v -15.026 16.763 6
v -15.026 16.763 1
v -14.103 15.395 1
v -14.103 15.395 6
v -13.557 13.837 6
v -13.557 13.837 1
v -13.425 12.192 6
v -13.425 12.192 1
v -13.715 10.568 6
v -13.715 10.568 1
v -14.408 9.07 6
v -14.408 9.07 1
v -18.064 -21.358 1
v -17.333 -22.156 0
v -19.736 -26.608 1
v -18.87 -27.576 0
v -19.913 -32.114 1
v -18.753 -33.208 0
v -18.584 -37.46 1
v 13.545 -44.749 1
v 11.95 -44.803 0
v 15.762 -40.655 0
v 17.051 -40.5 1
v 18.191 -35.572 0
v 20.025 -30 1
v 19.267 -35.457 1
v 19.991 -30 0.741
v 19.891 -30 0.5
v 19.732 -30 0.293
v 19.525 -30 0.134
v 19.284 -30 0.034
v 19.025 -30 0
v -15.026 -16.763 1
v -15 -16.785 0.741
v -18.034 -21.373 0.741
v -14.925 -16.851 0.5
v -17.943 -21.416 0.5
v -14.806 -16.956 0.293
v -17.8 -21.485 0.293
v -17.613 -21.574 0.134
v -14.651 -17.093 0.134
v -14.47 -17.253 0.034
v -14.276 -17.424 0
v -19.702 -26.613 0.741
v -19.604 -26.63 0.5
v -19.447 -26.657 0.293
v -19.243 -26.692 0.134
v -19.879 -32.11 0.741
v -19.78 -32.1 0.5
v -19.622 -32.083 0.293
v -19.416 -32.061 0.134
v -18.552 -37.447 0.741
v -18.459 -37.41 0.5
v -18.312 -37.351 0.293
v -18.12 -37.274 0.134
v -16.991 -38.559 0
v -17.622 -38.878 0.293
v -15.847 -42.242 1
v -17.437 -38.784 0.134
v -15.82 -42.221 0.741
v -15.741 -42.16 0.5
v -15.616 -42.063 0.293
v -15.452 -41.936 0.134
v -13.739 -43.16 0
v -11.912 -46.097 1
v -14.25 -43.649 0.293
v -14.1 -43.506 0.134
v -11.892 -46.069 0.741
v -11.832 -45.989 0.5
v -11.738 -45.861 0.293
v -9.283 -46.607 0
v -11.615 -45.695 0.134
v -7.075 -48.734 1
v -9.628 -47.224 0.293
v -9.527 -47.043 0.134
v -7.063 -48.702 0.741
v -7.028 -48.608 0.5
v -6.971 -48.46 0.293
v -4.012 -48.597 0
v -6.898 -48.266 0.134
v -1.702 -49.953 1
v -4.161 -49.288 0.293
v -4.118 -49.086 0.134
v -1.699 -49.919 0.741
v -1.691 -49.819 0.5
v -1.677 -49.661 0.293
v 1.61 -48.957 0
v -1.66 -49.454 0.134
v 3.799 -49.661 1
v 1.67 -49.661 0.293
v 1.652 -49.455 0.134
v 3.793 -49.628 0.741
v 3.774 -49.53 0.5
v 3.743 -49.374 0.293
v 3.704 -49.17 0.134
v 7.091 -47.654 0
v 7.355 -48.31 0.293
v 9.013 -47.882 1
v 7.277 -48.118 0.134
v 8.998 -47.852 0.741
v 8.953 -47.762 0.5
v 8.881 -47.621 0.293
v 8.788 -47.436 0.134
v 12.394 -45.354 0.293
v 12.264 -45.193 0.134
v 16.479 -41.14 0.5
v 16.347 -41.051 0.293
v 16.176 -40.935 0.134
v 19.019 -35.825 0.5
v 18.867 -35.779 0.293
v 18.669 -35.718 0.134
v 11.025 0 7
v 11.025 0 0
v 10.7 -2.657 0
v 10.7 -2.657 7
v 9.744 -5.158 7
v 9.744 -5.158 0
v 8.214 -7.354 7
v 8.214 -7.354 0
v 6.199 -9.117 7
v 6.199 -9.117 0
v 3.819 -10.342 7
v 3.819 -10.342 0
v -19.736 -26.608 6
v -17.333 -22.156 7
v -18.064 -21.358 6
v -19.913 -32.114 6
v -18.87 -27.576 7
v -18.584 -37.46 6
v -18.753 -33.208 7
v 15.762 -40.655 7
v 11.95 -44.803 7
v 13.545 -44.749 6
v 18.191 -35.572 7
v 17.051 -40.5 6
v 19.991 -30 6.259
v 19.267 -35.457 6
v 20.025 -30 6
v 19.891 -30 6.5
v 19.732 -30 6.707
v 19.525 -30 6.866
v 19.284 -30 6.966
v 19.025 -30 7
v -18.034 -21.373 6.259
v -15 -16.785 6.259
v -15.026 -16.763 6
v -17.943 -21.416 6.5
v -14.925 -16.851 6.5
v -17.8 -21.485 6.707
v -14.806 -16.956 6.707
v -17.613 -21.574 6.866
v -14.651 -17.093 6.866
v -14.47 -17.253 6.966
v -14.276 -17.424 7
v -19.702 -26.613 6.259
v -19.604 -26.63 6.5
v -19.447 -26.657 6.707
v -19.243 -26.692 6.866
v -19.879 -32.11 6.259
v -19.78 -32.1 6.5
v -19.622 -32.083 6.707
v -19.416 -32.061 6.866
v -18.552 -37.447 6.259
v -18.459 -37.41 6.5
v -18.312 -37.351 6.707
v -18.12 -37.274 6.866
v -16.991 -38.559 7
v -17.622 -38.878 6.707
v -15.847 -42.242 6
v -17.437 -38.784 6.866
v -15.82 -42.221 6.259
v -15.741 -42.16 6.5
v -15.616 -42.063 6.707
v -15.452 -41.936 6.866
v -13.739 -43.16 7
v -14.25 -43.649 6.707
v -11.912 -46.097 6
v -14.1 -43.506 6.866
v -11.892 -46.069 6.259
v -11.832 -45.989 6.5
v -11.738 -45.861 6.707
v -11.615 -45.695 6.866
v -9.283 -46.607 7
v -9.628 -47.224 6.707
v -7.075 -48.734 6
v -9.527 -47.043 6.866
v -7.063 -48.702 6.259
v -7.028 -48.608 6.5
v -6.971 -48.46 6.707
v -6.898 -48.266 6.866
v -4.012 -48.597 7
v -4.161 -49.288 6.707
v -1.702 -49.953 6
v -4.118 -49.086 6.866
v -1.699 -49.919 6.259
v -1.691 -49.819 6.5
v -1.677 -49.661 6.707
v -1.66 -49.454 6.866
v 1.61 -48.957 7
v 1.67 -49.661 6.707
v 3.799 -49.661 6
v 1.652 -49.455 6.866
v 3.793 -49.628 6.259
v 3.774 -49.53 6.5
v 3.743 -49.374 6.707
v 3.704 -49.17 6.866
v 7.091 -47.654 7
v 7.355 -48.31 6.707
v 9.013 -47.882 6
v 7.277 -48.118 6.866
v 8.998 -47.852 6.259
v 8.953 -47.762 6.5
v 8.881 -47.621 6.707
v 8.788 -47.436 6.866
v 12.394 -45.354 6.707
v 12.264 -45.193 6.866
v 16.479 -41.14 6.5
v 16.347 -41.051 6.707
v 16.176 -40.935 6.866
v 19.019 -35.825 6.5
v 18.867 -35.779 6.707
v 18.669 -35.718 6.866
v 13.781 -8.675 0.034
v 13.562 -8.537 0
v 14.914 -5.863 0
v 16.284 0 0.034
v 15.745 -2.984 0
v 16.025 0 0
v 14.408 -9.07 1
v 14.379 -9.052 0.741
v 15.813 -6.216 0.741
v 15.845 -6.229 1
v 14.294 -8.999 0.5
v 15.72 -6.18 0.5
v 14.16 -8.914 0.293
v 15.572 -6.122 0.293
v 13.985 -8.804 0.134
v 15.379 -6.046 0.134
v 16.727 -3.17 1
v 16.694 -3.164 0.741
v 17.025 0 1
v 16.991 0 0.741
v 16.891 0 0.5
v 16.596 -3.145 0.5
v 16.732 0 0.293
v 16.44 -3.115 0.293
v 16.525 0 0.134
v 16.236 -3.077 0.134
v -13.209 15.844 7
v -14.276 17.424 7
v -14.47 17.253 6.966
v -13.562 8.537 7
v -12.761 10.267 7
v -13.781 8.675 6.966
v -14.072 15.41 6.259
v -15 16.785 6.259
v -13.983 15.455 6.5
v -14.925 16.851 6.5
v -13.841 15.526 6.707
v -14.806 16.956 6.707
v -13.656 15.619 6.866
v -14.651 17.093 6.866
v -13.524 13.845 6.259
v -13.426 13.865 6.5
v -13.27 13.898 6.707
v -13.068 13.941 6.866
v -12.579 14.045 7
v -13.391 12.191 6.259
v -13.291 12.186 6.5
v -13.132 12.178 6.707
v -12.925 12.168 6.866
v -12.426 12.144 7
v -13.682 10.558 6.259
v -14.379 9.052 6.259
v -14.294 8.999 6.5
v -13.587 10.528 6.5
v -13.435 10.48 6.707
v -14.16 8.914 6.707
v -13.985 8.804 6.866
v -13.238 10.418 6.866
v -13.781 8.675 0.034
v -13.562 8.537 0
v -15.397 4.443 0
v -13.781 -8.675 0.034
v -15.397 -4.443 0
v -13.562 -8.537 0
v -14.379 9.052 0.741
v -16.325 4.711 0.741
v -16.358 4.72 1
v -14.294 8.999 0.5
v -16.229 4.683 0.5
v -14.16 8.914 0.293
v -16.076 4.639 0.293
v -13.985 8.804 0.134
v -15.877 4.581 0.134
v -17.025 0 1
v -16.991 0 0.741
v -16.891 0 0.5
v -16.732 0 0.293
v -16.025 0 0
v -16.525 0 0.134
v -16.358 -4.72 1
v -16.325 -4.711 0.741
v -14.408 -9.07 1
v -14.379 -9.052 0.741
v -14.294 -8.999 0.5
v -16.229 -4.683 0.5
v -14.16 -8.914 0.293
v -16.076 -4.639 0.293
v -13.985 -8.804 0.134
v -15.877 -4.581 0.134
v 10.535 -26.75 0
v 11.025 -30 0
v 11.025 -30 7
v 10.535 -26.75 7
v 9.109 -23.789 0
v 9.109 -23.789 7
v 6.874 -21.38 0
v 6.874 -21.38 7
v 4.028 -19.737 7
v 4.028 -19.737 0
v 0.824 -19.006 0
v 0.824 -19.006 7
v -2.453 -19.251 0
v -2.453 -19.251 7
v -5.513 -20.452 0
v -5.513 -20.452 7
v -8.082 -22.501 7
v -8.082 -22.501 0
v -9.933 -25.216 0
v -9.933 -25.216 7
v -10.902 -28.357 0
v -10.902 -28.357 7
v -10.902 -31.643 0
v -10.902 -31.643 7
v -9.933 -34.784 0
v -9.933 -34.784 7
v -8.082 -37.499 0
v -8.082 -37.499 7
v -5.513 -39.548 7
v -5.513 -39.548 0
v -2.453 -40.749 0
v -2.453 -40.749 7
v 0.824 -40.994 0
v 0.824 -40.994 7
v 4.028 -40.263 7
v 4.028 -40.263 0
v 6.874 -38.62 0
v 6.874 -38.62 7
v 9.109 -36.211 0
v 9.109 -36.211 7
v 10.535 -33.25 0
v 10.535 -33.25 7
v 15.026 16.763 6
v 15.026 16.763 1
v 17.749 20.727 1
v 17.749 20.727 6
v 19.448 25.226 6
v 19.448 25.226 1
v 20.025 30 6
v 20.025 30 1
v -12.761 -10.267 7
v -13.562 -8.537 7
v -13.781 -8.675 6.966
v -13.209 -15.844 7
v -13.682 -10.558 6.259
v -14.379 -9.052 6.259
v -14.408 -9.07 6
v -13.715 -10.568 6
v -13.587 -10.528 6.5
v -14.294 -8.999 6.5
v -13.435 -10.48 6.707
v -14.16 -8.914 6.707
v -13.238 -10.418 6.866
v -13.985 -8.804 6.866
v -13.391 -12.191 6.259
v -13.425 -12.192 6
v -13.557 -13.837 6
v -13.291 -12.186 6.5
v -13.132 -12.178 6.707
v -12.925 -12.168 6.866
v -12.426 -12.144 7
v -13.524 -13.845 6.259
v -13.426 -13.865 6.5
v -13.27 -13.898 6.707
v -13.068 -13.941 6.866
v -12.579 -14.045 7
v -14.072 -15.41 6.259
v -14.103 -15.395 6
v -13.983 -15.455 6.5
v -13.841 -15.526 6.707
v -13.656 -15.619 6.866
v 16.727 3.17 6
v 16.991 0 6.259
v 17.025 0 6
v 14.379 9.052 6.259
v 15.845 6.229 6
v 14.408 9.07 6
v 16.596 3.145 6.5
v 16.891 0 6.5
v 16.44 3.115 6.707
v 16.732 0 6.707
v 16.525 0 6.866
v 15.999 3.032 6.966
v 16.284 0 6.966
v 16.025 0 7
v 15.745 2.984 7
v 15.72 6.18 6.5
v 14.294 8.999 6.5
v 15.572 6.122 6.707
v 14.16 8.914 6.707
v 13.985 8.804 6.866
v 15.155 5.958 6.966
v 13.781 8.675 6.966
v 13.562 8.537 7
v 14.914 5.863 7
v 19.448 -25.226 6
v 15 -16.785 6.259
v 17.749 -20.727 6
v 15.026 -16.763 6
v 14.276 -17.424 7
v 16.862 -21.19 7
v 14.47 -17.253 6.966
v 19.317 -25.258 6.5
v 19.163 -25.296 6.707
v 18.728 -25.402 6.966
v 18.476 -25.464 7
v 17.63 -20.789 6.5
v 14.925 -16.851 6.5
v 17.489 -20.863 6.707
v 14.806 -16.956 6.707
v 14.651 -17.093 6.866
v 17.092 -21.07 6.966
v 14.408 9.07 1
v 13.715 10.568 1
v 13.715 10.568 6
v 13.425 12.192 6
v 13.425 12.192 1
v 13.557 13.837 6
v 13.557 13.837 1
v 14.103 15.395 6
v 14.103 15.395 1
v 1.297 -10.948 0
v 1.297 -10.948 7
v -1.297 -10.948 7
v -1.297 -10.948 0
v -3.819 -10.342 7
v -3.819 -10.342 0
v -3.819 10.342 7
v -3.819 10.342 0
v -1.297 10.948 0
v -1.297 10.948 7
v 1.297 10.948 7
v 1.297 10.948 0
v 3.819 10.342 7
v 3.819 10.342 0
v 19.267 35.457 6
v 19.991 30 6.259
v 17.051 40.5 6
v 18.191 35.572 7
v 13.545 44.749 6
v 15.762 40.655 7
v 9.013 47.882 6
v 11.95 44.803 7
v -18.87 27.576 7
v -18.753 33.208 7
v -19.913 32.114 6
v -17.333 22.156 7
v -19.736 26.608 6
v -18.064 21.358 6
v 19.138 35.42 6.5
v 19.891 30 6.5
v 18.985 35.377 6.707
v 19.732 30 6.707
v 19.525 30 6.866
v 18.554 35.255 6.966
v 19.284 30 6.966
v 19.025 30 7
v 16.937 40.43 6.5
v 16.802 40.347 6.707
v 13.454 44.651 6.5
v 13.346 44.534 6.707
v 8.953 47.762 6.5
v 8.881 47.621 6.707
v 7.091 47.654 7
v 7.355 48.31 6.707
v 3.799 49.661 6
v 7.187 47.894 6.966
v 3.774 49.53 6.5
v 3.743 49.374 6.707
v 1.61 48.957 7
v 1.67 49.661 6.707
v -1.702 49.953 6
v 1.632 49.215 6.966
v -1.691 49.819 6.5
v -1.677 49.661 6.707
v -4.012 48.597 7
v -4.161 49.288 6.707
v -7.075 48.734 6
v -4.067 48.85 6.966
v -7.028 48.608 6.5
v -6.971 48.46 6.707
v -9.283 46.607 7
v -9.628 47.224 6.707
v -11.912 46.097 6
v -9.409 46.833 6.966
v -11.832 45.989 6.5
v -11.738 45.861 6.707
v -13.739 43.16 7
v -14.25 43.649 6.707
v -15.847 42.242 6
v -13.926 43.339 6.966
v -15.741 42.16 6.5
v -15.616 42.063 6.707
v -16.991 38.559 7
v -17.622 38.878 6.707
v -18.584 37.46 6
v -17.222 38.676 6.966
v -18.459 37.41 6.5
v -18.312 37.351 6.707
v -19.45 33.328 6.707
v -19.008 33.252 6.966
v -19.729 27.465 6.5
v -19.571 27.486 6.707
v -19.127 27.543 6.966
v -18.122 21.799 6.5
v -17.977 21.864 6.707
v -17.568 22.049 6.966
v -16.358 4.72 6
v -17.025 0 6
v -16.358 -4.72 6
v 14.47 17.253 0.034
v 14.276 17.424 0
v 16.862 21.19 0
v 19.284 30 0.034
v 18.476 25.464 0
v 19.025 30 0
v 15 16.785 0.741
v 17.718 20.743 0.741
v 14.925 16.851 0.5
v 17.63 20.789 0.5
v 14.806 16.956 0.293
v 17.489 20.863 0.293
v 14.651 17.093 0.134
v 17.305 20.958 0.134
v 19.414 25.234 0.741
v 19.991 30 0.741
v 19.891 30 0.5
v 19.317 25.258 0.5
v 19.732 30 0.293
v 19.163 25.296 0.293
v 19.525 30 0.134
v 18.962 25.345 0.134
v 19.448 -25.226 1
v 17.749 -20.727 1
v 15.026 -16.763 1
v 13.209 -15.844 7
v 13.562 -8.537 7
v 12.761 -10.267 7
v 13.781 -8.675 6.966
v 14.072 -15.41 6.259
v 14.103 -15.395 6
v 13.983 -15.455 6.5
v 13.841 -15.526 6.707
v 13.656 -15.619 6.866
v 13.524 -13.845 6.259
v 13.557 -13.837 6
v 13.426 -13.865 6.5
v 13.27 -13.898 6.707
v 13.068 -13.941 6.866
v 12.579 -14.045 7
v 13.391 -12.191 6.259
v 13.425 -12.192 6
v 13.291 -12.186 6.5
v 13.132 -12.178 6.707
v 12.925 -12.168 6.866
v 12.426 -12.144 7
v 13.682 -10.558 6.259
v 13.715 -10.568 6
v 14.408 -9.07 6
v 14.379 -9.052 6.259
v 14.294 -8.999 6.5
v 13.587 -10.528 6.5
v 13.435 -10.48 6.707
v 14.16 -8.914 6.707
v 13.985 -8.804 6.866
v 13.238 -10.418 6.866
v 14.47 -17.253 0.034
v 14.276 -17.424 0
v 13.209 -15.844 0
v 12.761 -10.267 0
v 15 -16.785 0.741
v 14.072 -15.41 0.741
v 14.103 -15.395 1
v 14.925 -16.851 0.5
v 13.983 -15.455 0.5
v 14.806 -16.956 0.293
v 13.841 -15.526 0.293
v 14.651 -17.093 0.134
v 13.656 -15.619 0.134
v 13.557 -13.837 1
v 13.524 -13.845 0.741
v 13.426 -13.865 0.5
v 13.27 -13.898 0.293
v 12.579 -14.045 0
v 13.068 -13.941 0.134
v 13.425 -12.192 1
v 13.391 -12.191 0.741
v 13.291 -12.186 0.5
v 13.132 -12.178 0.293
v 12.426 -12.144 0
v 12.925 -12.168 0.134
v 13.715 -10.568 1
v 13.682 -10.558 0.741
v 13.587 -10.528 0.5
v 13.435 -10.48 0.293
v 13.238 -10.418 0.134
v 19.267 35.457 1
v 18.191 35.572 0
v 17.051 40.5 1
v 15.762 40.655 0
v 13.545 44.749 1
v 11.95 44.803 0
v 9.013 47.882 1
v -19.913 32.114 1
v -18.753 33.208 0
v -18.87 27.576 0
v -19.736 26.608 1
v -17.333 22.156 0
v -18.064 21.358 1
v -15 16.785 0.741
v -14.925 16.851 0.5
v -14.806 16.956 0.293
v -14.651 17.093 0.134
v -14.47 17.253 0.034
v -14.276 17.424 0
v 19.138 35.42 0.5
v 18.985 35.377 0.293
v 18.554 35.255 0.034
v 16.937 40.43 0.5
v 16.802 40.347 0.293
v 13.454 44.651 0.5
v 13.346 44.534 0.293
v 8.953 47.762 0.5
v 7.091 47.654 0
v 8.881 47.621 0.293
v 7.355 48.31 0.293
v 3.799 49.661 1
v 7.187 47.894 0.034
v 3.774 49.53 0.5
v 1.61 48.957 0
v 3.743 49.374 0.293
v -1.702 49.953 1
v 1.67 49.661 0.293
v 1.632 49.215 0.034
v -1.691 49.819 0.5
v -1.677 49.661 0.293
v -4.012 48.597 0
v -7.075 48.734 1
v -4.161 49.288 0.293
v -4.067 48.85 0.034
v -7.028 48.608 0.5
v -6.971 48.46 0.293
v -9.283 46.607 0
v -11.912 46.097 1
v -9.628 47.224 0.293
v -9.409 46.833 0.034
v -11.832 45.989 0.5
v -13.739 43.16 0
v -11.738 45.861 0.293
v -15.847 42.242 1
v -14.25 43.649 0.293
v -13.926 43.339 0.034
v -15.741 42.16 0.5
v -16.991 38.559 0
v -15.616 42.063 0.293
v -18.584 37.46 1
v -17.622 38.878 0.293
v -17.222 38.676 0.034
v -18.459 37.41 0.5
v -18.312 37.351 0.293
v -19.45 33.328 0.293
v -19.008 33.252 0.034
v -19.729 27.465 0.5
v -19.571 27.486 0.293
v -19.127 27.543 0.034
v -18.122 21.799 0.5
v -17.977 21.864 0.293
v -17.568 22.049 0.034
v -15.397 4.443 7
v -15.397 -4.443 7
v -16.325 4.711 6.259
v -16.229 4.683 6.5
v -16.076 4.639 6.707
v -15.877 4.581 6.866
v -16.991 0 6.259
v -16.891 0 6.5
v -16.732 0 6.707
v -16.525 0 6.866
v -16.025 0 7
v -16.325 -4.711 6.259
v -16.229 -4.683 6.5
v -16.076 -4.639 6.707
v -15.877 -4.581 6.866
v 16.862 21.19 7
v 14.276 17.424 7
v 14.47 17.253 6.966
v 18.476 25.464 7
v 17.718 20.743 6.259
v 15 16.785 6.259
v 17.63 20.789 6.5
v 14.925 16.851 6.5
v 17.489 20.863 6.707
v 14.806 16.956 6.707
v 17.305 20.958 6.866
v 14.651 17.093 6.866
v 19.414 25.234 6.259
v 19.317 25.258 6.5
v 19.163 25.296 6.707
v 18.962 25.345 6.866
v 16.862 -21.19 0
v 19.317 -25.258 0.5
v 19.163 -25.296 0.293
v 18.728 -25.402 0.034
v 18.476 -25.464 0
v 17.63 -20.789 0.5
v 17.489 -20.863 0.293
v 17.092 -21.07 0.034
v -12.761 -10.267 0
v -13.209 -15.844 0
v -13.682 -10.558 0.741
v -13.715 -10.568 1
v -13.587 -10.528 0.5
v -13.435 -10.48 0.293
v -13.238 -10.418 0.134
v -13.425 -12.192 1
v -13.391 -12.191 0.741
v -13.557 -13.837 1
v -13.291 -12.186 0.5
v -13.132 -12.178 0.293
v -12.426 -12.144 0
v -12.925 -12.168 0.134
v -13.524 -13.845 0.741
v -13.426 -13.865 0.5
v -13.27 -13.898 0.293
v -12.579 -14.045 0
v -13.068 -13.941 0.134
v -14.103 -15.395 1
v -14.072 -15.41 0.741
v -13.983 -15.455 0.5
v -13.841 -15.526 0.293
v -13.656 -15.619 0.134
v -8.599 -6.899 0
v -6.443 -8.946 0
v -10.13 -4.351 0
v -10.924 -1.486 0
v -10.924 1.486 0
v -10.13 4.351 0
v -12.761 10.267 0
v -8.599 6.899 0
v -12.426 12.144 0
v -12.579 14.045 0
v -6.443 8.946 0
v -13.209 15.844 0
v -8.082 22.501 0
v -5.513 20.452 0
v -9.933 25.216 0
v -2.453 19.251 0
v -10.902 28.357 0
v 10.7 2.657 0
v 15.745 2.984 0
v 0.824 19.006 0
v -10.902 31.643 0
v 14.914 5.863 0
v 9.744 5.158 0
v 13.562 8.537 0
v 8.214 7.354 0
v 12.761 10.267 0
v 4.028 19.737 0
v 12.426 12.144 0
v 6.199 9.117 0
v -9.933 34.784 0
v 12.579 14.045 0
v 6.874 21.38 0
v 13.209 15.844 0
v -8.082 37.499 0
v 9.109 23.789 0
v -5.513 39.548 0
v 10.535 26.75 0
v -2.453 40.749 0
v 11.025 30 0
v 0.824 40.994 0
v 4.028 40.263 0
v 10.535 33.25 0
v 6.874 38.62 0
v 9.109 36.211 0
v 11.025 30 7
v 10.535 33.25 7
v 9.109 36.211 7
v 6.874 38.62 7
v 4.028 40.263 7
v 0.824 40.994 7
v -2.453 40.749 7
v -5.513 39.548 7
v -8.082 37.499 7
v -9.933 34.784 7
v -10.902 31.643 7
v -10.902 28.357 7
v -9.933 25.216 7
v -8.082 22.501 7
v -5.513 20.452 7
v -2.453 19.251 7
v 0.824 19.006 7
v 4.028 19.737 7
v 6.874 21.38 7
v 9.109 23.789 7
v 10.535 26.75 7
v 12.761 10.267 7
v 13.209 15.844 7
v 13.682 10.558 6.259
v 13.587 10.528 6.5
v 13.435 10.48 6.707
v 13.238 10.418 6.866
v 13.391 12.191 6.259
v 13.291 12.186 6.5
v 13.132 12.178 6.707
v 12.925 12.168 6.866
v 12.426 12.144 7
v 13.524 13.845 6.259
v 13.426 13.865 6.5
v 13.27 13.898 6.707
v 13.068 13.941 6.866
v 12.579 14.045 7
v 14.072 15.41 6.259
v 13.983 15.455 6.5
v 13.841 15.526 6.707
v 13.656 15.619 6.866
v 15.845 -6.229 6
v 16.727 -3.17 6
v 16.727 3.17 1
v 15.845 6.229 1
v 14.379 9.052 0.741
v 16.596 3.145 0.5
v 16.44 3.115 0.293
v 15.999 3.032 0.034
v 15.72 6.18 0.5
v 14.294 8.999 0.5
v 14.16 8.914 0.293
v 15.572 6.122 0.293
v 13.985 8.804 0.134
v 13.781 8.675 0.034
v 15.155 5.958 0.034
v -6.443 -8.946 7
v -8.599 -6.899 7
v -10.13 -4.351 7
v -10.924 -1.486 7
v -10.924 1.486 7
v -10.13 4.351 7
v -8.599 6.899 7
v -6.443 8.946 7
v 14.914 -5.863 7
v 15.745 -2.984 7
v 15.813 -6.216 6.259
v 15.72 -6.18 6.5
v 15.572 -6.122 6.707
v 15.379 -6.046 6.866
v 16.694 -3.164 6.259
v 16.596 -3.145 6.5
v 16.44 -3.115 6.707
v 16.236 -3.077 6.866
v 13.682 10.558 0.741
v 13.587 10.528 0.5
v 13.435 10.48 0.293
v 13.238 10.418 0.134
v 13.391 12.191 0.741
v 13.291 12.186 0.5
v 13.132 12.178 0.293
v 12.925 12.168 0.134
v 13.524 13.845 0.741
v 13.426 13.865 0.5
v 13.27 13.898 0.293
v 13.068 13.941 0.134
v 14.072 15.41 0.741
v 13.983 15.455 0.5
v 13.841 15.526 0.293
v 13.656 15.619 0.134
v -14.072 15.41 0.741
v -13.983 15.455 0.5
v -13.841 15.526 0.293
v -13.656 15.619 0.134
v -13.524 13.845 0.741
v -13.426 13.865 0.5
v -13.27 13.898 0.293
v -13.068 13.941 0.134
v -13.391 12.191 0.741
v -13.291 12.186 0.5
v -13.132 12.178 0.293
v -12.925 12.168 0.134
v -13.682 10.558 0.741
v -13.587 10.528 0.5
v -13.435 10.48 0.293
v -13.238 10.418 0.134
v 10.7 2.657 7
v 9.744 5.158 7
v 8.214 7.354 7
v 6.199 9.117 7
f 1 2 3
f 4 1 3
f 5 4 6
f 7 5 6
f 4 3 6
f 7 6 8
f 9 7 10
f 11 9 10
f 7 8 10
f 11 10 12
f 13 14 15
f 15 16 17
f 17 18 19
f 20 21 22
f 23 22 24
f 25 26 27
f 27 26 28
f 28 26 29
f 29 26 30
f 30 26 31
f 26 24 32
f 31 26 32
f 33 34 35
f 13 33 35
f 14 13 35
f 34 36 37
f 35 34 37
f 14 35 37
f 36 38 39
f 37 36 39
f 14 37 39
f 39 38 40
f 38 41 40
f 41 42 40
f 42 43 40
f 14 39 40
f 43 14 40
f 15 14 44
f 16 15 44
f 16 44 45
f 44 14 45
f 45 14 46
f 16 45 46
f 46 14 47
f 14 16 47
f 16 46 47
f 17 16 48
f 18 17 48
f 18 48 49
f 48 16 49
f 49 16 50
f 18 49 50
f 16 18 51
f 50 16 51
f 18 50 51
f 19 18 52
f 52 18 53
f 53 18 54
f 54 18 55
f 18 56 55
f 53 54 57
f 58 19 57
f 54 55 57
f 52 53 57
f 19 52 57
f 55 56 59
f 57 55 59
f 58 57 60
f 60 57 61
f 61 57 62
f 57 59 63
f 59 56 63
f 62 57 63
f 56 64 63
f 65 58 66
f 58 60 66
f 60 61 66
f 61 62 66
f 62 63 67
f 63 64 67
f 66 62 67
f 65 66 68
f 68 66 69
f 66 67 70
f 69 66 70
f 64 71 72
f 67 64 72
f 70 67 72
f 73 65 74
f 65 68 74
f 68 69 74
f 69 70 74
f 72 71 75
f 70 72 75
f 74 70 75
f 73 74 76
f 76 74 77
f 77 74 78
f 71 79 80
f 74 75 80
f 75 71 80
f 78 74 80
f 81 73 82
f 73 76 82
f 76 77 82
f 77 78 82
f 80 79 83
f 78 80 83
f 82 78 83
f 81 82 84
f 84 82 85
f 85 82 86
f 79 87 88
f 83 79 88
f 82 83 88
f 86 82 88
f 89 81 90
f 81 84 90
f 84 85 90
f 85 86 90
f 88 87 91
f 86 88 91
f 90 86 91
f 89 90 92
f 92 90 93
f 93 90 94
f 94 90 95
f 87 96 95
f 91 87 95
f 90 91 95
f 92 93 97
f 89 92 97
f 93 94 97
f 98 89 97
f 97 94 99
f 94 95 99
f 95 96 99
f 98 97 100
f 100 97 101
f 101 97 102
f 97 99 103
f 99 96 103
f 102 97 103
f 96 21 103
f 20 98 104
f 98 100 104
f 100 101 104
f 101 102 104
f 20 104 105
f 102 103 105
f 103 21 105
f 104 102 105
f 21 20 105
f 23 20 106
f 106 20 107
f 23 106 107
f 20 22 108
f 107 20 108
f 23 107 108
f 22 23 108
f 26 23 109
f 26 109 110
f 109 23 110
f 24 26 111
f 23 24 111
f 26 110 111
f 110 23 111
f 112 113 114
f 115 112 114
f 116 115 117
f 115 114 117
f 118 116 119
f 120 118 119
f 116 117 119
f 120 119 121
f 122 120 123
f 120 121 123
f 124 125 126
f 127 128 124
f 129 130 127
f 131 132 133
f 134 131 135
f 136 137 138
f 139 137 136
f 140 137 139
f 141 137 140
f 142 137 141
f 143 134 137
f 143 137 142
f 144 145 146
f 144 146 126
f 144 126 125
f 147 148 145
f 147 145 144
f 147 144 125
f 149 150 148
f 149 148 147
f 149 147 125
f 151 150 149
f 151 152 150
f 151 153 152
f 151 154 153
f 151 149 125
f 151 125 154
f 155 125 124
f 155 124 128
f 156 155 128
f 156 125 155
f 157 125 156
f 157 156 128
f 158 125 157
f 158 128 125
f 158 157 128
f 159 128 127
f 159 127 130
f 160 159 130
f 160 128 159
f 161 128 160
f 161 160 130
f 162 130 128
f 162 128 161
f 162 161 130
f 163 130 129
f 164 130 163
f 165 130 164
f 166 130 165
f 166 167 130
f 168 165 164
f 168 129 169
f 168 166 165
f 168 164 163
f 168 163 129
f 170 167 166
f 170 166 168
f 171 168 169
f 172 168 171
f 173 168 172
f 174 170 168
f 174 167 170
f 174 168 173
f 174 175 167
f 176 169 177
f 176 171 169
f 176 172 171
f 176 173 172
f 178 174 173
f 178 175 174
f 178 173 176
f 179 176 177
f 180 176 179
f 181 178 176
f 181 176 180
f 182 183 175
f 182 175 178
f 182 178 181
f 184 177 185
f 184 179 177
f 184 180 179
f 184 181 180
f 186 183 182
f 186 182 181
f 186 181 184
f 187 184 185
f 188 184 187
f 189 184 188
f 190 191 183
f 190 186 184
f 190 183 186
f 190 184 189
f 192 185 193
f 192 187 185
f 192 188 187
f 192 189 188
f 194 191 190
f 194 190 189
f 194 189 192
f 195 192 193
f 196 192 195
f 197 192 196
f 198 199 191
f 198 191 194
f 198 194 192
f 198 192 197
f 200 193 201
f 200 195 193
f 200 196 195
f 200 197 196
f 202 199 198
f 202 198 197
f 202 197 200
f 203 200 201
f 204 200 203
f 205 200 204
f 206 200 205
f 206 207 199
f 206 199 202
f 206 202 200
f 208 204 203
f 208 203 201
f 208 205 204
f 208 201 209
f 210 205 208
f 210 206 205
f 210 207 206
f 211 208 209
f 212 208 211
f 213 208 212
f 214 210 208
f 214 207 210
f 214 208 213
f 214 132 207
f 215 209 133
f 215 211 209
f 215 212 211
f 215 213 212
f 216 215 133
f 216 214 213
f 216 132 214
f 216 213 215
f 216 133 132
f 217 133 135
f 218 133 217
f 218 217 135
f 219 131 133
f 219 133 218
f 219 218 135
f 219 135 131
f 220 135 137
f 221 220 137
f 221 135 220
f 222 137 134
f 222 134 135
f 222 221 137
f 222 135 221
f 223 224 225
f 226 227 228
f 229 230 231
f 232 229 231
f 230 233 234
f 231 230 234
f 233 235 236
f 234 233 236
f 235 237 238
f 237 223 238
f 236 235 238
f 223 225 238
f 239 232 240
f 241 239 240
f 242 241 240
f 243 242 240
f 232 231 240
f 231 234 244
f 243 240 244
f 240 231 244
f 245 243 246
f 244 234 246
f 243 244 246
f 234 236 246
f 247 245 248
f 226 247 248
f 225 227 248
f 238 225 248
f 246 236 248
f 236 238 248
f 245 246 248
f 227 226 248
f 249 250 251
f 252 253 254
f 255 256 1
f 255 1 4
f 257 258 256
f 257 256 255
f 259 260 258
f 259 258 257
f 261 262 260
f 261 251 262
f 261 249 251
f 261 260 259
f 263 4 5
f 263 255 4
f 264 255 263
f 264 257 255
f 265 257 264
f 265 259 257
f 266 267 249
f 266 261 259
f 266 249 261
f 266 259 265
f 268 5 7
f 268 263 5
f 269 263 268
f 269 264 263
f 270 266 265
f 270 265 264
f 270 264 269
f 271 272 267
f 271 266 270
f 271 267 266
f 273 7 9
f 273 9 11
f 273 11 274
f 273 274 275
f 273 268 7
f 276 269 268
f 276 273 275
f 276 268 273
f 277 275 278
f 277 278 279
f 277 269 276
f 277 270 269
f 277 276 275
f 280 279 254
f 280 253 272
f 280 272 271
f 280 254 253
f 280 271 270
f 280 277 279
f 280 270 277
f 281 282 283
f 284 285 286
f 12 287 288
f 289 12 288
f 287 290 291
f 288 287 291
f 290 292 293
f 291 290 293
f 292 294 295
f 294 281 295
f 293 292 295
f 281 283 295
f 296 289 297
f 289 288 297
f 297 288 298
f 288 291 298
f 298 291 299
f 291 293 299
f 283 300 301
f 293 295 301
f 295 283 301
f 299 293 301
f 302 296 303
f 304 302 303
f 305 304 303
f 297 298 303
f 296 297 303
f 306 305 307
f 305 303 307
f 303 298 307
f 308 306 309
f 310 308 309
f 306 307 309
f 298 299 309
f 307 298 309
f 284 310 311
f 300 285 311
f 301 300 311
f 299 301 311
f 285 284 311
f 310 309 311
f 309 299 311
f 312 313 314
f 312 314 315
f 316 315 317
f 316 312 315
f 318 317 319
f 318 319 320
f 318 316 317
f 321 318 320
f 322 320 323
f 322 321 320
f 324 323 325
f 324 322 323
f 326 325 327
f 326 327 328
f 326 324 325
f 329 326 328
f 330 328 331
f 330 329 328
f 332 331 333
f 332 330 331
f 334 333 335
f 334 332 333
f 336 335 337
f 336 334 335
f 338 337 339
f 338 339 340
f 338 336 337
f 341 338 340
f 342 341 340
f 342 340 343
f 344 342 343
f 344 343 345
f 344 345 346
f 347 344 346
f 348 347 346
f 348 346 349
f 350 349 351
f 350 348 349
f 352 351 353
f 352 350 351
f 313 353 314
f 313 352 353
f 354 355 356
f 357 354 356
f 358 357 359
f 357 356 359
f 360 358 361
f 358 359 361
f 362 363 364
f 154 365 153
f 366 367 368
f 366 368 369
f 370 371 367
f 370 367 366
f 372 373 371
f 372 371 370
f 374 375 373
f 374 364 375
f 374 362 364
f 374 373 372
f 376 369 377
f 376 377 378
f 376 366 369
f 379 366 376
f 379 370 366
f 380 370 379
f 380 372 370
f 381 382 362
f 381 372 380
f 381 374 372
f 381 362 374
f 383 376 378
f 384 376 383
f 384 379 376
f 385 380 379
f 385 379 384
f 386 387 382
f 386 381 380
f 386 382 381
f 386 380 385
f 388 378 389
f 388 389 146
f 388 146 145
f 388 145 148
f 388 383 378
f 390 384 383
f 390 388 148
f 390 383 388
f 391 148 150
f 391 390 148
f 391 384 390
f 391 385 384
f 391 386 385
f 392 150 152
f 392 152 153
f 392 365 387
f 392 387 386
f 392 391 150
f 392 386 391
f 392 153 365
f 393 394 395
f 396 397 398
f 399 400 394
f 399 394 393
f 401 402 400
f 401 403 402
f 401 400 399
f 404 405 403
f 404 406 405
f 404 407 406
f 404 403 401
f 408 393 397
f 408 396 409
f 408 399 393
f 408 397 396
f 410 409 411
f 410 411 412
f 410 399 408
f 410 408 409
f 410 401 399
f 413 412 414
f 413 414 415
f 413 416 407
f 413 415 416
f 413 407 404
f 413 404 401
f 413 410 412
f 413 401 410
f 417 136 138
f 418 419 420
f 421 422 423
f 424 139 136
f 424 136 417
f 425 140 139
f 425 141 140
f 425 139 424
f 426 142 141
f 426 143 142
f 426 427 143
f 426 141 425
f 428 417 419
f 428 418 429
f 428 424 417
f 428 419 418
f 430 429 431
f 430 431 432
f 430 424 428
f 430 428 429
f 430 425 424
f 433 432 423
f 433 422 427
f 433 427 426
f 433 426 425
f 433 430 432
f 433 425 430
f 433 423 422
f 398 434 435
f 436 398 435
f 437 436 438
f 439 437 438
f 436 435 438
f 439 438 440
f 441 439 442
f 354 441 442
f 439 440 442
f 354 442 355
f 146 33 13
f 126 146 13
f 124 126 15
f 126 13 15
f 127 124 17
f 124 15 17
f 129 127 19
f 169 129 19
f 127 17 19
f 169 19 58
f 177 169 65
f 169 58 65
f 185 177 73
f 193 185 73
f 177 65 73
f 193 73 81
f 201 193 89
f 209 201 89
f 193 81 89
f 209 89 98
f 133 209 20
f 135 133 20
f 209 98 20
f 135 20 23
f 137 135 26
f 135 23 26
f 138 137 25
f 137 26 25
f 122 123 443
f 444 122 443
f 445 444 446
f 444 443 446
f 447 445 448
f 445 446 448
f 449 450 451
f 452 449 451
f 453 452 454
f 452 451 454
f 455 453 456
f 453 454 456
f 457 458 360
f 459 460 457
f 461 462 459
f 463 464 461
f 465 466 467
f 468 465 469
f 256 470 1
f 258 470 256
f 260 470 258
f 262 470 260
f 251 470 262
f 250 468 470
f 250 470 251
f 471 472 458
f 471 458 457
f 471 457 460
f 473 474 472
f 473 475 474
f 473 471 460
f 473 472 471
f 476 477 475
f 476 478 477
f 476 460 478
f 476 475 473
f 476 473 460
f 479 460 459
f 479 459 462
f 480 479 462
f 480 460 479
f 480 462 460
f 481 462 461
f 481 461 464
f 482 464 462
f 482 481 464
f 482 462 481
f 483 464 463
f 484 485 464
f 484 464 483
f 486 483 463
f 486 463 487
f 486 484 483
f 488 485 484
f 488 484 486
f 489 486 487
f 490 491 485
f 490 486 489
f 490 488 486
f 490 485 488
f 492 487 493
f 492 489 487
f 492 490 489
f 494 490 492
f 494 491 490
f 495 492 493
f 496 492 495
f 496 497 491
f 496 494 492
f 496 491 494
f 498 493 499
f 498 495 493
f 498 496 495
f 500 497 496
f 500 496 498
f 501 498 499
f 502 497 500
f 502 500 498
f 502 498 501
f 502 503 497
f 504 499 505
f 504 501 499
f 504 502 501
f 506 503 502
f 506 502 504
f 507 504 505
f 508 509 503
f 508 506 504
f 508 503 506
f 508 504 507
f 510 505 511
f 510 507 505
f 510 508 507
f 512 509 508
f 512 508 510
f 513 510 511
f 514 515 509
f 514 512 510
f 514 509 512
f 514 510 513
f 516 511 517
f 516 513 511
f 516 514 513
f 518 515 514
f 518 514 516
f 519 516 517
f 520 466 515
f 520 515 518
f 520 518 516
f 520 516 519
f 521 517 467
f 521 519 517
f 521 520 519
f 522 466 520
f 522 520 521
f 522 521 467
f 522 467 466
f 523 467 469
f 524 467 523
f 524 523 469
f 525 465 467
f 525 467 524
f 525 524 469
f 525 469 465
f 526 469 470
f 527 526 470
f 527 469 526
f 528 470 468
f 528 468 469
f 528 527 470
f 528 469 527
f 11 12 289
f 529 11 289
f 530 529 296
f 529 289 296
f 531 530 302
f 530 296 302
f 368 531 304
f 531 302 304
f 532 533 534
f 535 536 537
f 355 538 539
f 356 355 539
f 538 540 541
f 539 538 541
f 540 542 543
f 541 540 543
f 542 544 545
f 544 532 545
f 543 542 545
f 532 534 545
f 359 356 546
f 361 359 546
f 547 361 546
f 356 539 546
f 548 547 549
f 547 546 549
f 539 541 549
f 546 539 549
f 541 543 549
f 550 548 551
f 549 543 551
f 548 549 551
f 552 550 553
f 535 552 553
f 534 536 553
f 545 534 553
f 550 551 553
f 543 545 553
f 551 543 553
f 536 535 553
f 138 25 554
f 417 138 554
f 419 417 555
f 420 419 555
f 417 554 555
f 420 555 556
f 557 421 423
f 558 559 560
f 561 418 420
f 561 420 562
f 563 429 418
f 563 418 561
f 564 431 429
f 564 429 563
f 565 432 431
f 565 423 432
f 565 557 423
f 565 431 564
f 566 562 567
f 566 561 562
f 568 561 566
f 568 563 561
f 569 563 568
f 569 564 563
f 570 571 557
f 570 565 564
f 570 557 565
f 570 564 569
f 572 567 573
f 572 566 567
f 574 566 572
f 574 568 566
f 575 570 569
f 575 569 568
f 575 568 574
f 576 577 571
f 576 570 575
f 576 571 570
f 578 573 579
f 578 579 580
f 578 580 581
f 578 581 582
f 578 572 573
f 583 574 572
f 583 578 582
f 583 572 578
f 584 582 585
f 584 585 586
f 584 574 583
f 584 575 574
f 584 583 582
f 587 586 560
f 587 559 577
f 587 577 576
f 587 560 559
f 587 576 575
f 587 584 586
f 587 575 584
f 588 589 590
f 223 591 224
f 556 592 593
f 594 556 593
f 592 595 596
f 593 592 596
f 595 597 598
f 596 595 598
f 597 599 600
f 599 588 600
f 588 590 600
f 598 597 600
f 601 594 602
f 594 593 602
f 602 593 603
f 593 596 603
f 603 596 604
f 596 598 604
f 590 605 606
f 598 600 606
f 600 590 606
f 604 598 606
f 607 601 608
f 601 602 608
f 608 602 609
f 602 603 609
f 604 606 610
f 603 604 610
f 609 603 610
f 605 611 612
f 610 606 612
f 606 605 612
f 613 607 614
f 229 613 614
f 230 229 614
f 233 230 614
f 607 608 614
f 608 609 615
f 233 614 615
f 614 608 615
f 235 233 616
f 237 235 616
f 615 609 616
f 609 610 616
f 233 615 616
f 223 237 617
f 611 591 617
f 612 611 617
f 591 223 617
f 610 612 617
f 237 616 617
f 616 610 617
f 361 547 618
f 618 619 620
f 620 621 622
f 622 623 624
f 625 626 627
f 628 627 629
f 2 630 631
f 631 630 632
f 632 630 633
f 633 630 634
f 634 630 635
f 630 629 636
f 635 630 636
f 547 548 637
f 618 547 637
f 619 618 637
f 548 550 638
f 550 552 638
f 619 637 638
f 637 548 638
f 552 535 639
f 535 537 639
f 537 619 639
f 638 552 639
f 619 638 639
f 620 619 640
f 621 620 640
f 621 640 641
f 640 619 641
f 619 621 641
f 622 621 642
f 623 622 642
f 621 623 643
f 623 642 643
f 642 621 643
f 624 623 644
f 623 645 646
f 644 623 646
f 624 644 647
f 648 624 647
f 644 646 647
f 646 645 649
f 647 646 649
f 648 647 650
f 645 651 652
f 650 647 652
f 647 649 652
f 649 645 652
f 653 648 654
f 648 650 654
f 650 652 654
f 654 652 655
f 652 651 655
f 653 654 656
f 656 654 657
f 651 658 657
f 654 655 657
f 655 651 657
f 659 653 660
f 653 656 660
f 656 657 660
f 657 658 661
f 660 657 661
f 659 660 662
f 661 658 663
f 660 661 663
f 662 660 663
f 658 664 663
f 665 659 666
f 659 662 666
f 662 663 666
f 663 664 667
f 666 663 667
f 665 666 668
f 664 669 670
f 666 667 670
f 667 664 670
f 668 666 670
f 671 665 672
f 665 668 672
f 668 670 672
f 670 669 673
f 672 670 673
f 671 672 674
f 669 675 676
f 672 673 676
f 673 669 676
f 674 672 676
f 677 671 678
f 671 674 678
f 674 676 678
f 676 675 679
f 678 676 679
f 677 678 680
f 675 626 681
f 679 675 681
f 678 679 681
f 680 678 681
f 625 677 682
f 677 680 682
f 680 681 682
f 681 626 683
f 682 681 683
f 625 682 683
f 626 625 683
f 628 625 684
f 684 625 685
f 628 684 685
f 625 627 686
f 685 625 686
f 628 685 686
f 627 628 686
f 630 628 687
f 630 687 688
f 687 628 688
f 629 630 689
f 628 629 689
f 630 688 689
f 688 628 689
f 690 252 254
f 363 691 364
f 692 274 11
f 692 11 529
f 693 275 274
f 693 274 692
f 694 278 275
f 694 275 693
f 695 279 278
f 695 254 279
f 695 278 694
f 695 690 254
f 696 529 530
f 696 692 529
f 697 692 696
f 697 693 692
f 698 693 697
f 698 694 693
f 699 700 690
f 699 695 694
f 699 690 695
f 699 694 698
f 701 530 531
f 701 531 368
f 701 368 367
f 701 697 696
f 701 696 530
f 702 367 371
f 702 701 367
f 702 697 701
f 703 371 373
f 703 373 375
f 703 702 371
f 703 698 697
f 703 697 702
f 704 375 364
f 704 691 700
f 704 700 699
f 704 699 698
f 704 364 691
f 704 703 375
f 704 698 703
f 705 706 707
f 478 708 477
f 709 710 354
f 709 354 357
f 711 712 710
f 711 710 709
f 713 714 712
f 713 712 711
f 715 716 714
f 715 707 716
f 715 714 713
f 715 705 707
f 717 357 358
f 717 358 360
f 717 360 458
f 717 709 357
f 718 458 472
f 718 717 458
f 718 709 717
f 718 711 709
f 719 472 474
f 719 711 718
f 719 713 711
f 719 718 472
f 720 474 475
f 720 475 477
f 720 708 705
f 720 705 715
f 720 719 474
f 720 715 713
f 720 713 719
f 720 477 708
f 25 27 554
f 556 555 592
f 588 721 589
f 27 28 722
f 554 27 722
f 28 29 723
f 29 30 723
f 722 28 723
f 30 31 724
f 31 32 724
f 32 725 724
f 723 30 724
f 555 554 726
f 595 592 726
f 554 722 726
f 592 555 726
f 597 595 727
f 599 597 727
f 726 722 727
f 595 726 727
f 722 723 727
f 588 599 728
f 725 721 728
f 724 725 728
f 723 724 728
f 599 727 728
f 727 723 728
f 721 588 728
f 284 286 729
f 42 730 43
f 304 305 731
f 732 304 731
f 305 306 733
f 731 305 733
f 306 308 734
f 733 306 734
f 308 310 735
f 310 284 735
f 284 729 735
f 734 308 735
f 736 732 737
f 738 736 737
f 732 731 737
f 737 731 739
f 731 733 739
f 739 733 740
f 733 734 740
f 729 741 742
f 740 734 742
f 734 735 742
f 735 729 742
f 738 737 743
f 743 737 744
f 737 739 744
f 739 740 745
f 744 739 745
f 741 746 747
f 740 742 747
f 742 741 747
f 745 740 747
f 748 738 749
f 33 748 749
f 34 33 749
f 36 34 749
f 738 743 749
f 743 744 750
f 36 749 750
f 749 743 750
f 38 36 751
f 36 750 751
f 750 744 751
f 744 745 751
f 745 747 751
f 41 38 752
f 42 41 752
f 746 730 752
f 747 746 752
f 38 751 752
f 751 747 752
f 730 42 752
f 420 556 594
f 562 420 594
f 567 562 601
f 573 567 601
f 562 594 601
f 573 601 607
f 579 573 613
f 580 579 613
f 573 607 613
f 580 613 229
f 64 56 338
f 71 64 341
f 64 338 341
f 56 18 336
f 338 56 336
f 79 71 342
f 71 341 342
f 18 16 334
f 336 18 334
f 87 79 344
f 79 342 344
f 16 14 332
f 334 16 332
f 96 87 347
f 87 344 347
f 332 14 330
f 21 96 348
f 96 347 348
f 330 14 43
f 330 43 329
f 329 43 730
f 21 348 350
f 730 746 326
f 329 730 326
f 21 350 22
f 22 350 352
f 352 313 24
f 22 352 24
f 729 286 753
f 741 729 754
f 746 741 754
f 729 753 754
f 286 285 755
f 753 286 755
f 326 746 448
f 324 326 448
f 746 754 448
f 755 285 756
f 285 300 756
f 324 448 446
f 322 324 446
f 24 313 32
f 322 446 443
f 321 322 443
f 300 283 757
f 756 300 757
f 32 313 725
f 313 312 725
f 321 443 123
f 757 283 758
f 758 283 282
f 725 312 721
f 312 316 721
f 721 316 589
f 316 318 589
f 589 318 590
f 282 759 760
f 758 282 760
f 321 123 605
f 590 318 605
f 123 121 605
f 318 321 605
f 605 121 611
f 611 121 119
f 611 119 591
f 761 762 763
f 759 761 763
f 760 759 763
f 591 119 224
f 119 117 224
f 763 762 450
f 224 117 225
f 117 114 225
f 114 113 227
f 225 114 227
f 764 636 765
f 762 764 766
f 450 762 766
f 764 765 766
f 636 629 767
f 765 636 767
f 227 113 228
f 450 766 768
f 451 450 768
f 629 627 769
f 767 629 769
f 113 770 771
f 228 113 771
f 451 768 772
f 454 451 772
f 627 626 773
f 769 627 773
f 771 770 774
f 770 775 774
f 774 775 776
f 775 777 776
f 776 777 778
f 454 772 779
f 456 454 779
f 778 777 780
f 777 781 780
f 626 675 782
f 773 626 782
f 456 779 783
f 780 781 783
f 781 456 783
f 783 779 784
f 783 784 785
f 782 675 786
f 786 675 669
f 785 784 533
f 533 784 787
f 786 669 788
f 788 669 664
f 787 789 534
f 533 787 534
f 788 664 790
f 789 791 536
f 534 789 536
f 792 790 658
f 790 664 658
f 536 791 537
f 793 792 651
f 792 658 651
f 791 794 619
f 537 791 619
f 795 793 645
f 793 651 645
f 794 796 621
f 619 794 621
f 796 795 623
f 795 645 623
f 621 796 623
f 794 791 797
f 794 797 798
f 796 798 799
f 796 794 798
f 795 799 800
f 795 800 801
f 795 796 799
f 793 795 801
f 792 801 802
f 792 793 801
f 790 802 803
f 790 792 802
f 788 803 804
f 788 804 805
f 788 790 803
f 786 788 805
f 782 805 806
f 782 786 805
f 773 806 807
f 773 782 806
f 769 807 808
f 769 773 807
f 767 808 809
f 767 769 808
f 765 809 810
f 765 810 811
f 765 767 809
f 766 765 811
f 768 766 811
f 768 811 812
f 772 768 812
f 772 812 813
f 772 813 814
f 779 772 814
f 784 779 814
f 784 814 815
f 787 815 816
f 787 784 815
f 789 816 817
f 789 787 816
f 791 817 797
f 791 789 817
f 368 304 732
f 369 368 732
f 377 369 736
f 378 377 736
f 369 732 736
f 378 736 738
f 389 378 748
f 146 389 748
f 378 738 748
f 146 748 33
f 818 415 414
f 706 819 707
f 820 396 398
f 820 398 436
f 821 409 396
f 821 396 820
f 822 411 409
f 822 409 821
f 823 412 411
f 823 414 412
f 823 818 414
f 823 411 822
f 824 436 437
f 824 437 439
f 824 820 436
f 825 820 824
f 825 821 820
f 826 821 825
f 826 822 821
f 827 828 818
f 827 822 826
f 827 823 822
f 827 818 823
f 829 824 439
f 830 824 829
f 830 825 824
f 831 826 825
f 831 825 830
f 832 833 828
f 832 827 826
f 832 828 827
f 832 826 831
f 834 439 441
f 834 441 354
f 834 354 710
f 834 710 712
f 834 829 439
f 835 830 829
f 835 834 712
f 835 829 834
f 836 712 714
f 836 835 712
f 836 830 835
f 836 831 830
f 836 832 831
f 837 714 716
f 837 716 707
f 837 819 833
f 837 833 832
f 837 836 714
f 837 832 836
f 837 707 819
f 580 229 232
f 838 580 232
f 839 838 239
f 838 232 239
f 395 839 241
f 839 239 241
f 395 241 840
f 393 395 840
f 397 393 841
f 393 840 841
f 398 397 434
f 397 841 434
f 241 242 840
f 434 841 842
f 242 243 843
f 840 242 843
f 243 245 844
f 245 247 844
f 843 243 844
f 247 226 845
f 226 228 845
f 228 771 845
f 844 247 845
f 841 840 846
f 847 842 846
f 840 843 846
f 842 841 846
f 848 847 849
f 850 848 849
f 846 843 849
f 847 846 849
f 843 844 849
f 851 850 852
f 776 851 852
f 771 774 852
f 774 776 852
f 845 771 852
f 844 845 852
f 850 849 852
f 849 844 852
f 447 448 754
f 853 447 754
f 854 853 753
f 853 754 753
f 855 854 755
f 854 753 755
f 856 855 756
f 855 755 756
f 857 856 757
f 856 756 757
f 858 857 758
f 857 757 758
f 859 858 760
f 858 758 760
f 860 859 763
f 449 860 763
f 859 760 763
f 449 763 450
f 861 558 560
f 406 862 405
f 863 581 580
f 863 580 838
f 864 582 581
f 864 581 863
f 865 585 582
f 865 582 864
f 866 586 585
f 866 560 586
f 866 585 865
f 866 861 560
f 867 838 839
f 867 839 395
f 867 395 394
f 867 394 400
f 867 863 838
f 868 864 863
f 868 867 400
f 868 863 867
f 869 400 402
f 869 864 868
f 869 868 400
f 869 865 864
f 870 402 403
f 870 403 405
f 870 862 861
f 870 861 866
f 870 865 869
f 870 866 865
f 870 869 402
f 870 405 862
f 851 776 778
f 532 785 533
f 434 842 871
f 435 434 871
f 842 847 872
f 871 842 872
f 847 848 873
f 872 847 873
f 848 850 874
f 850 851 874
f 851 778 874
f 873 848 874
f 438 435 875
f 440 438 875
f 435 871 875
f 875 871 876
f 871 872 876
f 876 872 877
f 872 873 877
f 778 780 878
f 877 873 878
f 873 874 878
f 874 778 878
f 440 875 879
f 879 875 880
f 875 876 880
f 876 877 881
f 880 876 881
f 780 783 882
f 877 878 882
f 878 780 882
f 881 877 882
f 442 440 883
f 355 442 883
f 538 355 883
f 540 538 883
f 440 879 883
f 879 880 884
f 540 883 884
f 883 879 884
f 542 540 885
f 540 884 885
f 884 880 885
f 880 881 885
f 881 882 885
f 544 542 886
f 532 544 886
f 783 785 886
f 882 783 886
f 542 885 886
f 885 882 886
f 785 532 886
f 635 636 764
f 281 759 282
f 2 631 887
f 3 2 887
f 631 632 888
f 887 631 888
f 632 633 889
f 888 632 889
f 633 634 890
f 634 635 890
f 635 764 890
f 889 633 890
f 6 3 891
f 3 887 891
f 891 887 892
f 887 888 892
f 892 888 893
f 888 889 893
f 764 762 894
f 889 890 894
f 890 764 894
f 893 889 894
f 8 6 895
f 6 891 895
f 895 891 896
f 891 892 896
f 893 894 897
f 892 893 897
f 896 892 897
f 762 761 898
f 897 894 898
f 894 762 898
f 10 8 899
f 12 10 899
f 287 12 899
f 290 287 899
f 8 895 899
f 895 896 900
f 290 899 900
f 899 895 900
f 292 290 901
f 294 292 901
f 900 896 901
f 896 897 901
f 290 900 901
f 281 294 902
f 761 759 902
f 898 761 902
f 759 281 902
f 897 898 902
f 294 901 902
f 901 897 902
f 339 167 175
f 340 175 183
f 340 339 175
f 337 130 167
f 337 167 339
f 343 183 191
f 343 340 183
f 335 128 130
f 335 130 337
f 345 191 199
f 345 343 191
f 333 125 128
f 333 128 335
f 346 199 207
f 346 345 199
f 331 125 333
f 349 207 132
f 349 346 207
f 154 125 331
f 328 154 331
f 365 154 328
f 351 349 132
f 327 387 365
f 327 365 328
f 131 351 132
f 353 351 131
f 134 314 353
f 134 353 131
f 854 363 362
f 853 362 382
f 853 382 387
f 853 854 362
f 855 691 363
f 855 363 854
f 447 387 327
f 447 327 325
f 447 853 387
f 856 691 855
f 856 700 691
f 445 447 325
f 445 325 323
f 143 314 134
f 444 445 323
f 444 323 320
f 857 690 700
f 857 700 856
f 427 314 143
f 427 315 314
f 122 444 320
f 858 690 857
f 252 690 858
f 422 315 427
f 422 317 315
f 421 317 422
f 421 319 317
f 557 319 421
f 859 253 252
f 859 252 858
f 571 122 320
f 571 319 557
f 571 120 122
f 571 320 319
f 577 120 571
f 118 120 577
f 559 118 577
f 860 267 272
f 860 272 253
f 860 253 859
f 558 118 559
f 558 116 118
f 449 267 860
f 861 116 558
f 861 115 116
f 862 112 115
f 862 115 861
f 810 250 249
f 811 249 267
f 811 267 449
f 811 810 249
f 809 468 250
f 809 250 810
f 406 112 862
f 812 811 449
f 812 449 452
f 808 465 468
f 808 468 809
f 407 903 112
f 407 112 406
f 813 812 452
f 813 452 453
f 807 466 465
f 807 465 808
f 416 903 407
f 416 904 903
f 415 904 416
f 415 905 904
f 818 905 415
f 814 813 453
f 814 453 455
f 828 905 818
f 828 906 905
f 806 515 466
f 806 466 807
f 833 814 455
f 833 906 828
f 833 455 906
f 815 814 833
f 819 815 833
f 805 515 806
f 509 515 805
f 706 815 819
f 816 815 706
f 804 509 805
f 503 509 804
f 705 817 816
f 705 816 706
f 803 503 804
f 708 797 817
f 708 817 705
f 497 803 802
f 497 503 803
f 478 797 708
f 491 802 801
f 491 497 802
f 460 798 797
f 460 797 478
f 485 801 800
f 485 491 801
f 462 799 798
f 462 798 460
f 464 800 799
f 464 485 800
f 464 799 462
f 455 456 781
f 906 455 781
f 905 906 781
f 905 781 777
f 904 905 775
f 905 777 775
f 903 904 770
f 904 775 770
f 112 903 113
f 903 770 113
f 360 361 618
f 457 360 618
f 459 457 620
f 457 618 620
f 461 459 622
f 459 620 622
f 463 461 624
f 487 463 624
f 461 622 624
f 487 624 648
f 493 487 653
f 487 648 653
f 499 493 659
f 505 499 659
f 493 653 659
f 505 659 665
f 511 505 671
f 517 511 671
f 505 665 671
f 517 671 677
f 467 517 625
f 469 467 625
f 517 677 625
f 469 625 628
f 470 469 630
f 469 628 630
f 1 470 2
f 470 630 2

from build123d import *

# Parameters (mm, degrees)
F0_R     = 11.025
F1_DEPTH = 7
F2_R     = 1


# Not quite as in the source:
# - a feature names something its author has since deleted; it is built from what else it names


with BuildPart() as f1:
    # F0 (on Top) → F1 (new body)
    with BuildSketch(Plane.XY):
        with BuildLine():
            ThreePointArc((3.8188111697, 10.3425), (9.045800632, 6.3027070317), (11.025, 0))
            ThreePointArc((11.025, 0), (9.045800632, -6.3027070317), (3.8188111697, -10.3425))
            ThreePointArc((3.8188111697, -10.3425), (7.4507812466, -11.4127332882), (10.8163704055, -13.1475))
            ThreePointArc((10.8163704055, -13.1475), (12.7757955184, -11.2529851094), (14.4077918935, -9.0700693357))
            ThreePointArc((14.4077918935, -9.0700693357), (16.3576172162, -4.7200618647), (17.025, 0))
            ThreePointArc((17.025, 0), (16.3576172162, 4.7200618647), (14.4077918935, 9.0700693357))
            ThreePointArc((14.4077918935, 9.0700693357), (12.7757955184, 11.2529851094), (10.8163704055, 13.1475))
            ThreePointArc((10.8163704055, 13.1475), (7.4507812466, 11.4127332882), (3.8188111697, 10.3425))
        make_face()
        with BuildLine():
            ThreePointArc((-3.8188111697, -10.3425), (-11.025, 0), (-3.8188111697, 10.3425))
            ThreePointArc((-3.8188111697, 10.3425), (-7.4507812466, 11.4127332882), (-10.8163704055, 13.1475))
            ThreePointArc((-10.8163704055, 13.1475), (-12.7757955184, 11.2529851094), (-14.4077918935, 9.0700693357))
            ThreePointArc((-14.4077918935, 9.0700693357), (-17.025, 0), (-14.4077918935, -9.0700693357))
            ThreePointArc((-14.4077918935, -9.0700693357), (-12.7757955184, -11.2529851094), (-10.8163704055, -13.1475))
            ThreePointArc((-10.8163704055, -13.1475), (-7.4507812466, -11.4127332882), (-3.8188111697, -10.3425))
        make_face()
        with BuildLine():
            ThreePointArc((-10.8163704055, 13.1475), (0, 17.025), (10.8163704055, 13.1475))
            ThreePointArc((10.8163704055, 13.1475), (13.0469549327, 14.808634295), (15.0258776109, 16.7627938362))
            ThreePointArc((15.0258776109, 16.7627938362), (18.7335771298, 22.9251351305), (20.025, 30))
            ThreePointArc((20.025, 30), (-7.0748648695, 48.7335771298), (-15.0258776109, 16.7627938362))
            ThreePointArc((-15.0258776109, 16.7627938362), (-13.0469549327, 14.808634295), (-10.8163704055, 13.1475))
        make_face()
        with Locations((0, 30)):
            Circle(F0_R, mode=Mode.SUBTRACT)
        with BuildLine():
            ThreePointArc((15.0258776109, 16.7627938362), (13.0469549327, 14.808634295), (10.8163704055, 13.1475))
            ThreePointArc((10.8163704055, 13.1475), (12.7757955184, 11.2529851094), (14.4077918935, 9.0700693357))
            ThreePointArc((14.4077918935, 9.0700693357), (13.4378751676, 13.0191918827), (15.0258776109, 16.7627938362))
        make_face()
        with BuildLine():
            ThreePointArc((15.0258776109, -16.7627938362), (13.0469549327, -14.808634295), (10.8163704055, -13.1475))
            ThreePointArc((10.8163704055, -13.1475), (0, -17.025), (-10.8163704055, -13.1475))
            ThreePointArc((-10.8163704055, -13.1475), (-13.0469549327, -14.808634295), (-15.0258776109, -16.7627938362))
            ThreePointArc((-15.0258776109, -16.7627938362), (-7.0748648695, -48.7335771298), (20.025, -30))
            ThreePointArc((20.025, -30), (18.7335771298, -22.9251351305), (15.0258776109, -16.7627938362))
        make_face()
        with Locations((0, -30)):
            Circle(F0_R, mode=Mode.SUBTRACT)
        with BuildLine():
            ThreePointArc((14.4077918935, -9.0700693357), (12.7757955184, -11.2529851094), (10.8163704055, -13.1475))
            ThreePointArc((10.8163704055, -13.1475), (13.0469549327, -14.808634295), (15.0258776109, -16.7627938362))
            ThreePointArc((15.0258776109, -16.7627938362), (13.4378751676, -13.0191918827), (14.4077918935, -9.0700693357))
        make_face()
        with BuildLine():
            ThreePointArc((-14.4077918935, 9.0700693357), (-12.7757955184, 11.2529851094), (-10.8163704055, 13.1475))
            ThreePointArc((-10.8163704055, 13.1475), (-13.0469549327, 14.808634295), (-15.0258776109, 16.7627938362))
            ThreePointArc((-15.0258776109, 16.7627938362), (-13.4378751676, 13.0191918827), (-14.4077918935, 9.0700693357))
        make_face()
        with BuildLine():
            ThreePointArc((-15.0258776109, -16.7627938362), (-13.0469549327, -14.808634295), (-10.8163704055, -13.1475))
            ThreePointArc((-10.8163704055, -13.1475), (-12.7757955184, -11.2529851094), (-14.4077918935, -9.0700693357))
            ThreePointArc((-14.4077918935, -9.0700693357), (-13.4378751676, -13.0191918827), (-15.0258776109, -16.7627938362))
        make_face()
        with BuildLine():
            ThreePointArc((-3.8188111697, 10.3425), (0, 11.025), (3.8188111697, 10.3425))
            ThreePointArc((3.8188111697, 10.3425), (7.4507812466, 11.4127332882), (10.8163704055, 13.1475))
            ThreePointArc((10.8163704055, 13.1475), (0, 17.025), (-10.8163704055, 13.1475))
            ThreePointArc((-10.8163704055, 13.1475), (-7.4507812466, 11.4127332882), (-3.8188111697, 10.3425))
        make_face()
        with BuildLine():
            ThreePointArc((10.8163704055, -13.1475), (7.4507812466, -11.4127332882), (3.8188111697, -10.3425))
            ThreePointArc((3.8188111697, -10.3425), (0, -11.025), (-3.8188111697, -10.3425))
            ThreePointArc((-3.8188111697, -10.3425), (-7.4507812466, -11.4127332882), (-10.8163704055, -13.1475))
            ThreePointArc((-10.8163704055, -13.1475), (0, -17.025), (10.8163704055, -13.1475))
        make_face()
    extrude(amount=F1_DEPTH)

    # F2
    f2_edges = [f1.edges().sort_by_distance(p)[0] for p in [
        (15.025878, 16.762794, 3.5),
        (-15.025878, 16.762794, 3.5),
        (0, 50.025, 0),
        (0, 50.025, 7),
        (-14.407792, 9.070069, 3.5),
        (-13.437875, 13.019192, 0),
        (-13.437875, 13.019192, 7),
        (-14.407792, -9.070069, 3.5),
        (-15.025878, -16.762794, 3.5),
        (-13.437875, -13.019192, 0),
        (-13.437875, -13.019192, 7),
        (15.025878, -16.762794, 3.5),
        (0, -50.025, 0),
        (0, -50.025, 7),
    ]]
    fillet(f2_edges, radius=F2_R)


solid = f1.part
